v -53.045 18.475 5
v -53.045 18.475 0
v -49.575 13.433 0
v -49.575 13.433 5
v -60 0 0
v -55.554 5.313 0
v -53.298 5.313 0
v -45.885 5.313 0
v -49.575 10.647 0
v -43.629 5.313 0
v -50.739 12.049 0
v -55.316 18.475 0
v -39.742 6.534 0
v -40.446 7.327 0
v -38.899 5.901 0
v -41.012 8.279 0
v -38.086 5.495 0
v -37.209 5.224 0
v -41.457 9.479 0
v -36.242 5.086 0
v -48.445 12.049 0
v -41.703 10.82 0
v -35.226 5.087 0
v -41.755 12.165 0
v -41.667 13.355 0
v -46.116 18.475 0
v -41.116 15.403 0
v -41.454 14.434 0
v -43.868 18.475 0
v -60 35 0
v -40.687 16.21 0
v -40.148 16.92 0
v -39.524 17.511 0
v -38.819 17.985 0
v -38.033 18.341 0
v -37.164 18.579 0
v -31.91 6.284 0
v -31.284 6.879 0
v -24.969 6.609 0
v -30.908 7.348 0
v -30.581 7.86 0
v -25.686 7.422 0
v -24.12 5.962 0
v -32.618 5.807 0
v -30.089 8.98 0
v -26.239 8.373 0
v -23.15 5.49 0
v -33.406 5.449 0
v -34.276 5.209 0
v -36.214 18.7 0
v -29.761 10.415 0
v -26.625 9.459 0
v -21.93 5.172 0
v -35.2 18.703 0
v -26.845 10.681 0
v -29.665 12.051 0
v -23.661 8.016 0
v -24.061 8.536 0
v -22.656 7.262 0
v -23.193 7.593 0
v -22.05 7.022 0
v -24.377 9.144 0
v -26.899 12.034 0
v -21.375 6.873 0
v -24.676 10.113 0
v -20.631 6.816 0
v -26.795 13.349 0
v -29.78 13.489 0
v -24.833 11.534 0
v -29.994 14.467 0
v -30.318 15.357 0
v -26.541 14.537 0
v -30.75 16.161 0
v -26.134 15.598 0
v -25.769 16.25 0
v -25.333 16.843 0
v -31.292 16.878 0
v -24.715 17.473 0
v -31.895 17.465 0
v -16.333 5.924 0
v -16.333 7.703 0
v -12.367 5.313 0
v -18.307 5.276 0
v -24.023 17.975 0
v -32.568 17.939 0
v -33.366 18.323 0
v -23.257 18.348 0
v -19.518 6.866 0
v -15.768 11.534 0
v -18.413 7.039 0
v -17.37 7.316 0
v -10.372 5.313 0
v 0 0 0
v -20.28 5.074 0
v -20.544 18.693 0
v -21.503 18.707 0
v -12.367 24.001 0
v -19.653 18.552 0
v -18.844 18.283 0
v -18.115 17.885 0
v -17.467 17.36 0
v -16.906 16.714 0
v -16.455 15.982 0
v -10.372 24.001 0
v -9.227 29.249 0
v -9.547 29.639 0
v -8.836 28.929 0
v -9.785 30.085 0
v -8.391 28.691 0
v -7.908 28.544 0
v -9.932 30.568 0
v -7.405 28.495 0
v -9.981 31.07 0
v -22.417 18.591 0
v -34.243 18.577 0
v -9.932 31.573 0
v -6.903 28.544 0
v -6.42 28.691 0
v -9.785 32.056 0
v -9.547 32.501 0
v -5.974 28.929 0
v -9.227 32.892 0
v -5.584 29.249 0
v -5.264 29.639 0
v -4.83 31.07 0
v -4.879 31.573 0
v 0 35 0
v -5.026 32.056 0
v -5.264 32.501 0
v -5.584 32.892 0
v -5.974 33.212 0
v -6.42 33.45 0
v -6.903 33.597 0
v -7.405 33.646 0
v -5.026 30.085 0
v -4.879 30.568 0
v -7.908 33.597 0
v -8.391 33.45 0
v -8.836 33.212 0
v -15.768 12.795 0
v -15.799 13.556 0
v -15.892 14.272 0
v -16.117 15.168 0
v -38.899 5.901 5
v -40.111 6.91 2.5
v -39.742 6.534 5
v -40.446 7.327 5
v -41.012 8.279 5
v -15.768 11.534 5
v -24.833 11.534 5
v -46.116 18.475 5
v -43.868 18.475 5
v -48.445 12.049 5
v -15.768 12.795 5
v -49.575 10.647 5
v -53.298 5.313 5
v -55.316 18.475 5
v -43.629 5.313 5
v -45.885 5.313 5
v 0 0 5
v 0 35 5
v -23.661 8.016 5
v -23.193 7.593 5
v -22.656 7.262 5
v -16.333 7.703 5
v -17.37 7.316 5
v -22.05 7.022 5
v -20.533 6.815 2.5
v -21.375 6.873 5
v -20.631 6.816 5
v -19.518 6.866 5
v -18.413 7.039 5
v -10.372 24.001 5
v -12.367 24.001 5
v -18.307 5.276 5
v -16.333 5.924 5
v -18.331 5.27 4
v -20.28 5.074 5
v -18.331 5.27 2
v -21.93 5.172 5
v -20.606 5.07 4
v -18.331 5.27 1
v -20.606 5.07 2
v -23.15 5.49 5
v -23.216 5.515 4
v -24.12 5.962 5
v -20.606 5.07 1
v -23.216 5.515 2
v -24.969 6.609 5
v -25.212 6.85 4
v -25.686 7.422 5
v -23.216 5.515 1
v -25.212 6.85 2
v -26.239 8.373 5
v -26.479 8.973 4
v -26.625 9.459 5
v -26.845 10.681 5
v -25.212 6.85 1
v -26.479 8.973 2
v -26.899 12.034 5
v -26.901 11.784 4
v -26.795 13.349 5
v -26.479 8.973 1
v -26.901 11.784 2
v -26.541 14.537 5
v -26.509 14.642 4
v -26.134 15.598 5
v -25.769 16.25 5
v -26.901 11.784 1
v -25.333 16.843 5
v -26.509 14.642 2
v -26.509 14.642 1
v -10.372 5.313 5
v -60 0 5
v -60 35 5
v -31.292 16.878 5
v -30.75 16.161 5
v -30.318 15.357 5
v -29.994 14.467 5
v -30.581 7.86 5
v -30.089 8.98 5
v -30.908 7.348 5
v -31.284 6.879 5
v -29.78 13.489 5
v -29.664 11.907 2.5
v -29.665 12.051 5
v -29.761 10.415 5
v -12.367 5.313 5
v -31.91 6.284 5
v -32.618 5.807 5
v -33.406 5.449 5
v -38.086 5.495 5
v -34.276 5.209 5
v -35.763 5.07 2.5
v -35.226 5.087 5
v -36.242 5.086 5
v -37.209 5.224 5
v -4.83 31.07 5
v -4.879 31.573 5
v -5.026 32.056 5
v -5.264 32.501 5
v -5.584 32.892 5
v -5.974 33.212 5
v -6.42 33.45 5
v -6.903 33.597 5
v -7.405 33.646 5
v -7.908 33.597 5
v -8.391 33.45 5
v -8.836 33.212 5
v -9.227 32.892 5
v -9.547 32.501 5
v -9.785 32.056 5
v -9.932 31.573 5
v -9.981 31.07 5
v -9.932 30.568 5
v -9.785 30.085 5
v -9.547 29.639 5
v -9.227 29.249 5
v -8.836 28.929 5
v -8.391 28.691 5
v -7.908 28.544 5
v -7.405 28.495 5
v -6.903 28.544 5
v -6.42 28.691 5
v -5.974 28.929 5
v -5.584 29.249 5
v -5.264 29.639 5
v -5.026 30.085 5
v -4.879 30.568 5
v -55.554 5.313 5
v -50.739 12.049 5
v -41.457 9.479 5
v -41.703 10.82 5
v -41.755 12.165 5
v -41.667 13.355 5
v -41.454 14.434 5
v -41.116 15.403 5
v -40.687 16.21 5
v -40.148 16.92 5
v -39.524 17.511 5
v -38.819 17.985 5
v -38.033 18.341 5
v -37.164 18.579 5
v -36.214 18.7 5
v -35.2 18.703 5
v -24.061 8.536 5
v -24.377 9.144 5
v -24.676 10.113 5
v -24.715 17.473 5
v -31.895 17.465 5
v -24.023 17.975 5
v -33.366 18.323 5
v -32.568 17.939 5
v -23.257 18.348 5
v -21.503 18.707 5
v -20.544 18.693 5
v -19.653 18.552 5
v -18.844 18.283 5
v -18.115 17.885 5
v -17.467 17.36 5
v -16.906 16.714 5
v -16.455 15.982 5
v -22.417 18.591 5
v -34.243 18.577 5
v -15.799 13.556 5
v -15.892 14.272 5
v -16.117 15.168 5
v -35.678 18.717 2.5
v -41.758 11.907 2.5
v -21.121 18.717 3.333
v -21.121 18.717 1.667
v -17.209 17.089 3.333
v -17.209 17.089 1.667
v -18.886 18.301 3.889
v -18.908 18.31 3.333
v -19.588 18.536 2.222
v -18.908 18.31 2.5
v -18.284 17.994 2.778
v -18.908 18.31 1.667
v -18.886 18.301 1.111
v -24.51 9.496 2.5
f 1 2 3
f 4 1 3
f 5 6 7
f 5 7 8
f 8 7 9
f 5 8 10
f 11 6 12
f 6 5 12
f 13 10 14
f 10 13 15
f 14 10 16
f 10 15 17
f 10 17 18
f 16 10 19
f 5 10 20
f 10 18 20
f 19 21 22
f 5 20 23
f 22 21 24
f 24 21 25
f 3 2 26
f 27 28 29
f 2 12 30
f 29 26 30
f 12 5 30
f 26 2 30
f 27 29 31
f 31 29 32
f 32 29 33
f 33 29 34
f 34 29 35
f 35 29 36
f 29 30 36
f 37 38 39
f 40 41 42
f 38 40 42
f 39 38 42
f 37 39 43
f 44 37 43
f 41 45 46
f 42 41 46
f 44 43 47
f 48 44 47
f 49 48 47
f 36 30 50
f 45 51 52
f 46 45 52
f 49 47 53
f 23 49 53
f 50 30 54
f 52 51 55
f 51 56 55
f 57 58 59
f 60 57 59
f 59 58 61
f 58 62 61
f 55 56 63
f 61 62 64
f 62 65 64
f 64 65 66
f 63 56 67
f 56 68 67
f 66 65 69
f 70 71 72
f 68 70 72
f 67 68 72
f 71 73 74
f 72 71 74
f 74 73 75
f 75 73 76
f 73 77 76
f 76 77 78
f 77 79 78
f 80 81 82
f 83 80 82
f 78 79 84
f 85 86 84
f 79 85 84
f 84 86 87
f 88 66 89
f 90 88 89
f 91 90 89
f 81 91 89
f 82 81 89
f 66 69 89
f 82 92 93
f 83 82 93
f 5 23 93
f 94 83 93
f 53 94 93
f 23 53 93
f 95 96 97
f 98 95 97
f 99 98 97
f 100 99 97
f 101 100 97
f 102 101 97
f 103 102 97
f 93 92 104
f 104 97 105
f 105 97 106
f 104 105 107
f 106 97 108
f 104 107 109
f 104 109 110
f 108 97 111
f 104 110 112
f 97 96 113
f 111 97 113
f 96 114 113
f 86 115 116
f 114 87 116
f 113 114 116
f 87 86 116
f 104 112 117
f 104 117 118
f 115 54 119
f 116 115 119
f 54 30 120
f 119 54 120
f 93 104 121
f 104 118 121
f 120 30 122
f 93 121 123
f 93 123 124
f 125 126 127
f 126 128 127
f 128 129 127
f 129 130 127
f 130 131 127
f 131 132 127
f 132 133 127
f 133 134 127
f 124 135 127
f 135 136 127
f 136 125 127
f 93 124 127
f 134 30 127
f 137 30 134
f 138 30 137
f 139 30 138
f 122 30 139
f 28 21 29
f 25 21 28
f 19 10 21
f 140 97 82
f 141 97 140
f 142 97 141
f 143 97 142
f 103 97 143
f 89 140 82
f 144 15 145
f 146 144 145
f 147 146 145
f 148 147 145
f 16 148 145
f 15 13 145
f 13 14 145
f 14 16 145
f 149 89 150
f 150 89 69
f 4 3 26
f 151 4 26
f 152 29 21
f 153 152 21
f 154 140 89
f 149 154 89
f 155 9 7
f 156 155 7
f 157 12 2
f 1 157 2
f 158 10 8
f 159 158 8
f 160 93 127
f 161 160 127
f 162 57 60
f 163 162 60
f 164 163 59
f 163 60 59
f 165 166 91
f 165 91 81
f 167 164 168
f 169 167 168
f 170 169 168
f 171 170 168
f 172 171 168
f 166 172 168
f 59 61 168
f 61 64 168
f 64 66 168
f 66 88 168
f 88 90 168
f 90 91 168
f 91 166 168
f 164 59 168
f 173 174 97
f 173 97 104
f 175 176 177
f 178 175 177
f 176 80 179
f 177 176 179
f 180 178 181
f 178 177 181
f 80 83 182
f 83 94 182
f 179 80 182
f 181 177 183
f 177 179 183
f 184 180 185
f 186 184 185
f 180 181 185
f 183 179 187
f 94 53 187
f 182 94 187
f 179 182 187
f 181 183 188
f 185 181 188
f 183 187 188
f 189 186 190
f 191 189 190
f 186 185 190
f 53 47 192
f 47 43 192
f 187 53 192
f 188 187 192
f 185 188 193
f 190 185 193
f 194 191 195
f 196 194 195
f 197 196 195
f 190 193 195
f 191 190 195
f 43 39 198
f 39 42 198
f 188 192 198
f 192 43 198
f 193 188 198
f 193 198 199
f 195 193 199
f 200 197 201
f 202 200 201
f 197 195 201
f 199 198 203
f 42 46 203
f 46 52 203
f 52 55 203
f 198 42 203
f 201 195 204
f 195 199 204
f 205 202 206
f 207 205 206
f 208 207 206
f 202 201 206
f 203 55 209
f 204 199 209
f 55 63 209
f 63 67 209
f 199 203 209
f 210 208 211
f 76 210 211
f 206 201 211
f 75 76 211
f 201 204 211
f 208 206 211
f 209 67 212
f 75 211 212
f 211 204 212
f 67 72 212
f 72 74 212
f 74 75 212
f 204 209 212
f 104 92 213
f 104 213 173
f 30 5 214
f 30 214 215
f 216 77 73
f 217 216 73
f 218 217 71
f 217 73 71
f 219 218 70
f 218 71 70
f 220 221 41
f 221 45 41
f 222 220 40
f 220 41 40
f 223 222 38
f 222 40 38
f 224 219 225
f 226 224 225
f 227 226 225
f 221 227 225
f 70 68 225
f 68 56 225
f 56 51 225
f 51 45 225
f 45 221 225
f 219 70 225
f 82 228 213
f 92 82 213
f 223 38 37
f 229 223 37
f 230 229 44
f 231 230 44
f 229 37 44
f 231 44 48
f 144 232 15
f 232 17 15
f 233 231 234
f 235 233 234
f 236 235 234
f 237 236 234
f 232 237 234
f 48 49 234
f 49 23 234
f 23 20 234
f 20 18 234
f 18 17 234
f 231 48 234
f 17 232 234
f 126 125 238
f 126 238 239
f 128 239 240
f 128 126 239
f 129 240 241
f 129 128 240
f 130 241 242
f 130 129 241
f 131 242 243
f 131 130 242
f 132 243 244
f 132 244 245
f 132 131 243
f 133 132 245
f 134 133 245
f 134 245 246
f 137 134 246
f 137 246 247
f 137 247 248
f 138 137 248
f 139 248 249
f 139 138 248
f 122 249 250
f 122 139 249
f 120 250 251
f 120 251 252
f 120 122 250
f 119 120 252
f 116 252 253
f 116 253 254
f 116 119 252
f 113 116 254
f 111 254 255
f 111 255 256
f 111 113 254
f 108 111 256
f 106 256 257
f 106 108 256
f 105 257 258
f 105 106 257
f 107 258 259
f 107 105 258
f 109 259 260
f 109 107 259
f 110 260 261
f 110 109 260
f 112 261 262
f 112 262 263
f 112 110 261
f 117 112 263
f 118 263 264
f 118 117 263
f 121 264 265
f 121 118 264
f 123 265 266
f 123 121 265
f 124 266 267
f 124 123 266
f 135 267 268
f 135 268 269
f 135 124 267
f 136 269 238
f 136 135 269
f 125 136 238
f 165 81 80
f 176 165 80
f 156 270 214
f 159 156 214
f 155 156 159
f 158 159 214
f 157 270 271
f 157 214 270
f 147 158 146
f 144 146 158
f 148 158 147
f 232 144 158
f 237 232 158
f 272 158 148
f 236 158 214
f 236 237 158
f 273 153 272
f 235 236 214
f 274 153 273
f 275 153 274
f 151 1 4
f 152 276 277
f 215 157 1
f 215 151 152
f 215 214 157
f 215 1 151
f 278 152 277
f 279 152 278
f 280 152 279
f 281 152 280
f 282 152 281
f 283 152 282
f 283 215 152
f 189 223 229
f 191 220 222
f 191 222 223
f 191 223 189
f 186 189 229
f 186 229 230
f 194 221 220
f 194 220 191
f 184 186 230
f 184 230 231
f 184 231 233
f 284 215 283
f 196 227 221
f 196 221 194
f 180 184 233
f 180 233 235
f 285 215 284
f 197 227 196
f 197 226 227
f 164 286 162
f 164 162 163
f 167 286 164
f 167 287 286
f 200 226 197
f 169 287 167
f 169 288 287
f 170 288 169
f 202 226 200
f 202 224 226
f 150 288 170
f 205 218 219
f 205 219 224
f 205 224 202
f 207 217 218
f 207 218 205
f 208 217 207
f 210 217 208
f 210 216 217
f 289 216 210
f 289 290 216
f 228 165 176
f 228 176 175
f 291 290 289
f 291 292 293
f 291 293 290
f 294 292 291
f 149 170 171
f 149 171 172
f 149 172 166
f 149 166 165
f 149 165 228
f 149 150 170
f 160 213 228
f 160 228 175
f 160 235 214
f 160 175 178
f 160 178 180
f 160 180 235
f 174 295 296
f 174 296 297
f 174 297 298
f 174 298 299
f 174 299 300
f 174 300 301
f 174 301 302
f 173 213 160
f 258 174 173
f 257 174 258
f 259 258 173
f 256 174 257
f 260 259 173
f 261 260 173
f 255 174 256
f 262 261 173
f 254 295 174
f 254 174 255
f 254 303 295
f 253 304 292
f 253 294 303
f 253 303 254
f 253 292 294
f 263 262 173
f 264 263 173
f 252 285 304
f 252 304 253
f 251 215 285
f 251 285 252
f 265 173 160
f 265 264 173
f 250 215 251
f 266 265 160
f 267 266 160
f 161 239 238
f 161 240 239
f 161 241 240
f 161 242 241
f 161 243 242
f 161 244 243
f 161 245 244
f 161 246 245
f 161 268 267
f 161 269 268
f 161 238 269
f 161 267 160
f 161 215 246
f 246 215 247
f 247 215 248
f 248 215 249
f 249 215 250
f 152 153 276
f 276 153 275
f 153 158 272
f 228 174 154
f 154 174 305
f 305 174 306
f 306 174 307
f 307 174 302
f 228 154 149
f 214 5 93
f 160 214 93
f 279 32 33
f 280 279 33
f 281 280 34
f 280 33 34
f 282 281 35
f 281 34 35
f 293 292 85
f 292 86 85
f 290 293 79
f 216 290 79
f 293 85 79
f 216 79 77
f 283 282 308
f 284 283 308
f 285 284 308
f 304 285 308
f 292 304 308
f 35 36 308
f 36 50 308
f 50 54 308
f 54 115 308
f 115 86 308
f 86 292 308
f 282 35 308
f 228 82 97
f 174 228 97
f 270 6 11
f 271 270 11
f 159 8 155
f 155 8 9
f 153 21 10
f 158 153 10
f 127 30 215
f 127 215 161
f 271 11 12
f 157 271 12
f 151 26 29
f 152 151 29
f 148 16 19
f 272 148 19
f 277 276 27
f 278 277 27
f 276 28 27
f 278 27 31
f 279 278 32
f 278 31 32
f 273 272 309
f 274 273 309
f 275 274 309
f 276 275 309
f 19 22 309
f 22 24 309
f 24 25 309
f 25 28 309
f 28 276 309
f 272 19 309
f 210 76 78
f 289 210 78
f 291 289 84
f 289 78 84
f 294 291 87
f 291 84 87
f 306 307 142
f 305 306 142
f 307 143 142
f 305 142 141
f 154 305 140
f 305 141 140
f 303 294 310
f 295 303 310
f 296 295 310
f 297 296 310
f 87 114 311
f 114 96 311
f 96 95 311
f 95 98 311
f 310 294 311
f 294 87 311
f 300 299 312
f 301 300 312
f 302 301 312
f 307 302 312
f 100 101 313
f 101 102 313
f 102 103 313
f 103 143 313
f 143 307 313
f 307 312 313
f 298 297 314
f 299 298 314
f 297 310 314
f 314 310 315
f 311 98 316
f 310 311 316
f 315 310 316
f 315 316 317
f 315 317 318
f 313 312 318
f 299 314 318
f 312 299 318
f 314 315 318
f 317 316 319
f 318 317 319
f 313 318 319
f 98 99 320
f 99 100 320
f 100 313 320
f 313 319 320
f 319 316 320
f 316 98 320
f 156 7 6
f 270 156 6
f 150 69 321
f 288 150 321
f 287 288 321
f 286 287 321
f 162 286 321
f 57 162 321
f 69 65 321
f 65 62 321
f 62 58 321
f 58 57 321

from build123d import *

# Parameters (mm, degrees)
F0_W     = 60
F0_H     = 35
F0_W_2   = 1.9945063705
F0_H_2   = 18.6884094019
F0_R     = 2.5757746771
F1_DEPTH = 5


with BuildPart() as f1:
    # F0 (on Top) → F1 (new body)
    with BuildSketch(Plane.XY):
        with Locations((-30, 17.5)):
            Rectangle(F0_W, F0_H)
        Polygon((-55.554255027, 5.3125368431), (-50.7390016895, 12.0492799403), (-55.3159902969, 18.4747416964), (-53.044789401, 18.4747416964), (-49.5745788952, 13.4327525672), (-46.1158973279, 18.4747416964), (-43.8677543092, 18.4747416964), (-48.4447429165, 12.0492799403), (-43.629489579, 5.3125368431), (-45.8853185567, 5.3125368431), (-49.5745788952, 10.6465924158), (-53.2984260493, 5.3125368431), align=None, mode=Mode.SUBTRACT)
        with BuildLine():
            add(Edge.make_bspline(
                [(-31.2916038326, 16.8779837062), (-29.6641020062, 15.0391180062), (-29.6641020062, 11.9070896981)],
                knots=[0, 0, 0, 1, 1, 1], degree=2))
            add(Edge.make_bspline(
                [(-29.6641020062, 11.9070896981), (-29.6641020062, 8.686672861), (-31.2839178735, 6.8785509972)],
                knots=[0, 0, 0, 1, 1, 1], degree=2))
            add(Edge.make_bspline(
                [(-31.2839178735, 6.8785509972), (-32.9037337409, 5.0704291334), (-35.7629105032, 5.0704291334)],
                knots=[0, 0, 0, 1, 1, 1], degree=2))
            add(Edge.make_bspline(
                [(-35.7629105032, 5.0704291334), (-37.530681082, 5.0704291334), (-38.8987817908, 5.9005127096)],
                knots=[0, 0, 0, 1, 1, 1], degree=2))
            add(Edge.make_bspline(
                [(-38.8987817908, 5.9005127096), (-40.2668824997, 6.7305962857), (-41.0124205264, 8.2793170319)],
                knots=[0, 0, 0, 1, 1, 1], degree=2))
            add(Edge.make_bspline(
                [(-41.0124205264, 8.2793170319), (-41.7579585531, 9.8280377782), (-41.7579585531, 11.9070896981)],
                knots=[0, 0, 0, 1, 1, 1], degree=2))
            add(Edge.make_bspline(
                [(-41.7579585531, 11.9070896981), (-41.7579585531, 15.1236635556), (-40.1477501346, 16.9202564809)],
                knots=[0, 0, 0, 1, 1, 1], degree=2))
            add(Edge.make_bspline(
                [(-40.1477501346, 16.9202564809), (-38.537541716, 18.7168494061), (-35.6783649537, 18.7168494061)],
                knots=[0, 0, 0, 1, 1, 1], degree=2))
            add(Edge.make_bspline(
                [(-35.6783649537, 18.7168494061), (-32.9191056589, 18.7168494061), (-31.2916038326, 16.8779837062)],
                knots=[0, 0, 0, 1, 1, 1], degree=2))
        make_face(mode=Mode.SUBTRACT)
        with BuildLine():
            add(Edge.make_bspline(
                [(-18.3311554041, 5.2702640684), (-19.2726853863, 5.0704291334), (-20.6061992794, 5.0704291334)],
                knots=[0, 0, 0, 1, 1, 1], degree=2))
            add(Edge.make_bspline(
                [(-20.6061992794, 5.0704291334), (-23.5230207345, 5.0704291334), (-25.2120102332, 6.8497286508)],
                knots=[0, 0, 0, 1, 1, 1], degree=2))
            add(Edge.make_bspline(
                [(-25.2120102332, 6.8497286508), (-26.9009997319, 8.6290281682), (-26.9009997319, 11.7841143535)],
                knots=[0, 0, 0, 1, 1, 1], degree=2))
            add(Edge.make_bspline(
                [(-26.9009997319, 11.7841143535), (-26.9009997319, 14.9699443749), (-25.333064088, 16.8433968905)],
                knots=[0, 0, 0, 1, 1, 1], degree=2))
            add(Edge.make_bspline(
                [(-25.333064088, 16.8433968905), (-23.7651284442, 18.7168494061), (-21.121158535, 18.7168494061)],
                knots=[0, 0, 0, 1, 1, 1], degree=2))
            add(Edge.make_bspline(
                [(-21.121158535, 18.7168494061), (-18.6501227042, 18.7168494061), (-17.2090053845, 17.0893475797)],
                knots=[0, 0, 0, 1, 1, 1], degree=2))
            add(Edge.make_bspline(
                [(-17.2090053845, 17.0893475797), (-15.7678880648, 15.4618457533), (-15.7678880648, 12.794817967)],
                knots=[0, 0, 0, 1, 1, 1], degree=2))
            Line((-15.7678880648, 12.794817967), (-15.7678880648, 11.5343206847))
            Line((-15.7678880648, 11.5343206847), (-24.8334767505, 11.5343206847))
            add(Edge.make_bspline(
                [(-24.8334767505, 11.5343206847), (-24.7719890782, 9.2170040346), (-23.6613679972, 8.0160729349)],
                knots=[0, 0, 0, 1, 1, 1], degree=2))
            add(Edge.make_bspline(
                [(-23.6613679972, 8.0160729349), (-22.5507469161, 6.8151418351), (-20.5331826686, 6.8151418351)],
                knots=[0, 0, 0, 1, 1, 1], degree=2))
            add(Edge.make_bspline(
                [(-20.5331826686, 6.8151418351), (-18.4080149944, 6.8151418351), (-16.3328060541, 7.7028701041)],
                knots=[0, 0, 0, 1, 1, 1], degree=2))
            Line((-16.3328060541, 7.7028701041), (-16.3328060541, 5.9235705867))
            add(Edge.make_bspline(
                [(-16.3328060541, 5.9235705867), (-17.3896254219, 5.4700990034), (-18.3311554041, 5.2702640684)],
                knots=[0, 0, 0, 1, 1, 1], degree=2))
        make_face(mode=Mode.SUBTRACT)
        with Locations((-11.369598005, 14.6567415441)):
            Rectangle(F0_W_2, F0_H_2, mode=Mode.SUBTRACT)
        with Locations((-7.4053523131, 31.0702826828)):
            Circle(F0_R, mode=Mode.SUBTRACT)
    extrude(amount=F1_DEPTH)


solid = f1.part
